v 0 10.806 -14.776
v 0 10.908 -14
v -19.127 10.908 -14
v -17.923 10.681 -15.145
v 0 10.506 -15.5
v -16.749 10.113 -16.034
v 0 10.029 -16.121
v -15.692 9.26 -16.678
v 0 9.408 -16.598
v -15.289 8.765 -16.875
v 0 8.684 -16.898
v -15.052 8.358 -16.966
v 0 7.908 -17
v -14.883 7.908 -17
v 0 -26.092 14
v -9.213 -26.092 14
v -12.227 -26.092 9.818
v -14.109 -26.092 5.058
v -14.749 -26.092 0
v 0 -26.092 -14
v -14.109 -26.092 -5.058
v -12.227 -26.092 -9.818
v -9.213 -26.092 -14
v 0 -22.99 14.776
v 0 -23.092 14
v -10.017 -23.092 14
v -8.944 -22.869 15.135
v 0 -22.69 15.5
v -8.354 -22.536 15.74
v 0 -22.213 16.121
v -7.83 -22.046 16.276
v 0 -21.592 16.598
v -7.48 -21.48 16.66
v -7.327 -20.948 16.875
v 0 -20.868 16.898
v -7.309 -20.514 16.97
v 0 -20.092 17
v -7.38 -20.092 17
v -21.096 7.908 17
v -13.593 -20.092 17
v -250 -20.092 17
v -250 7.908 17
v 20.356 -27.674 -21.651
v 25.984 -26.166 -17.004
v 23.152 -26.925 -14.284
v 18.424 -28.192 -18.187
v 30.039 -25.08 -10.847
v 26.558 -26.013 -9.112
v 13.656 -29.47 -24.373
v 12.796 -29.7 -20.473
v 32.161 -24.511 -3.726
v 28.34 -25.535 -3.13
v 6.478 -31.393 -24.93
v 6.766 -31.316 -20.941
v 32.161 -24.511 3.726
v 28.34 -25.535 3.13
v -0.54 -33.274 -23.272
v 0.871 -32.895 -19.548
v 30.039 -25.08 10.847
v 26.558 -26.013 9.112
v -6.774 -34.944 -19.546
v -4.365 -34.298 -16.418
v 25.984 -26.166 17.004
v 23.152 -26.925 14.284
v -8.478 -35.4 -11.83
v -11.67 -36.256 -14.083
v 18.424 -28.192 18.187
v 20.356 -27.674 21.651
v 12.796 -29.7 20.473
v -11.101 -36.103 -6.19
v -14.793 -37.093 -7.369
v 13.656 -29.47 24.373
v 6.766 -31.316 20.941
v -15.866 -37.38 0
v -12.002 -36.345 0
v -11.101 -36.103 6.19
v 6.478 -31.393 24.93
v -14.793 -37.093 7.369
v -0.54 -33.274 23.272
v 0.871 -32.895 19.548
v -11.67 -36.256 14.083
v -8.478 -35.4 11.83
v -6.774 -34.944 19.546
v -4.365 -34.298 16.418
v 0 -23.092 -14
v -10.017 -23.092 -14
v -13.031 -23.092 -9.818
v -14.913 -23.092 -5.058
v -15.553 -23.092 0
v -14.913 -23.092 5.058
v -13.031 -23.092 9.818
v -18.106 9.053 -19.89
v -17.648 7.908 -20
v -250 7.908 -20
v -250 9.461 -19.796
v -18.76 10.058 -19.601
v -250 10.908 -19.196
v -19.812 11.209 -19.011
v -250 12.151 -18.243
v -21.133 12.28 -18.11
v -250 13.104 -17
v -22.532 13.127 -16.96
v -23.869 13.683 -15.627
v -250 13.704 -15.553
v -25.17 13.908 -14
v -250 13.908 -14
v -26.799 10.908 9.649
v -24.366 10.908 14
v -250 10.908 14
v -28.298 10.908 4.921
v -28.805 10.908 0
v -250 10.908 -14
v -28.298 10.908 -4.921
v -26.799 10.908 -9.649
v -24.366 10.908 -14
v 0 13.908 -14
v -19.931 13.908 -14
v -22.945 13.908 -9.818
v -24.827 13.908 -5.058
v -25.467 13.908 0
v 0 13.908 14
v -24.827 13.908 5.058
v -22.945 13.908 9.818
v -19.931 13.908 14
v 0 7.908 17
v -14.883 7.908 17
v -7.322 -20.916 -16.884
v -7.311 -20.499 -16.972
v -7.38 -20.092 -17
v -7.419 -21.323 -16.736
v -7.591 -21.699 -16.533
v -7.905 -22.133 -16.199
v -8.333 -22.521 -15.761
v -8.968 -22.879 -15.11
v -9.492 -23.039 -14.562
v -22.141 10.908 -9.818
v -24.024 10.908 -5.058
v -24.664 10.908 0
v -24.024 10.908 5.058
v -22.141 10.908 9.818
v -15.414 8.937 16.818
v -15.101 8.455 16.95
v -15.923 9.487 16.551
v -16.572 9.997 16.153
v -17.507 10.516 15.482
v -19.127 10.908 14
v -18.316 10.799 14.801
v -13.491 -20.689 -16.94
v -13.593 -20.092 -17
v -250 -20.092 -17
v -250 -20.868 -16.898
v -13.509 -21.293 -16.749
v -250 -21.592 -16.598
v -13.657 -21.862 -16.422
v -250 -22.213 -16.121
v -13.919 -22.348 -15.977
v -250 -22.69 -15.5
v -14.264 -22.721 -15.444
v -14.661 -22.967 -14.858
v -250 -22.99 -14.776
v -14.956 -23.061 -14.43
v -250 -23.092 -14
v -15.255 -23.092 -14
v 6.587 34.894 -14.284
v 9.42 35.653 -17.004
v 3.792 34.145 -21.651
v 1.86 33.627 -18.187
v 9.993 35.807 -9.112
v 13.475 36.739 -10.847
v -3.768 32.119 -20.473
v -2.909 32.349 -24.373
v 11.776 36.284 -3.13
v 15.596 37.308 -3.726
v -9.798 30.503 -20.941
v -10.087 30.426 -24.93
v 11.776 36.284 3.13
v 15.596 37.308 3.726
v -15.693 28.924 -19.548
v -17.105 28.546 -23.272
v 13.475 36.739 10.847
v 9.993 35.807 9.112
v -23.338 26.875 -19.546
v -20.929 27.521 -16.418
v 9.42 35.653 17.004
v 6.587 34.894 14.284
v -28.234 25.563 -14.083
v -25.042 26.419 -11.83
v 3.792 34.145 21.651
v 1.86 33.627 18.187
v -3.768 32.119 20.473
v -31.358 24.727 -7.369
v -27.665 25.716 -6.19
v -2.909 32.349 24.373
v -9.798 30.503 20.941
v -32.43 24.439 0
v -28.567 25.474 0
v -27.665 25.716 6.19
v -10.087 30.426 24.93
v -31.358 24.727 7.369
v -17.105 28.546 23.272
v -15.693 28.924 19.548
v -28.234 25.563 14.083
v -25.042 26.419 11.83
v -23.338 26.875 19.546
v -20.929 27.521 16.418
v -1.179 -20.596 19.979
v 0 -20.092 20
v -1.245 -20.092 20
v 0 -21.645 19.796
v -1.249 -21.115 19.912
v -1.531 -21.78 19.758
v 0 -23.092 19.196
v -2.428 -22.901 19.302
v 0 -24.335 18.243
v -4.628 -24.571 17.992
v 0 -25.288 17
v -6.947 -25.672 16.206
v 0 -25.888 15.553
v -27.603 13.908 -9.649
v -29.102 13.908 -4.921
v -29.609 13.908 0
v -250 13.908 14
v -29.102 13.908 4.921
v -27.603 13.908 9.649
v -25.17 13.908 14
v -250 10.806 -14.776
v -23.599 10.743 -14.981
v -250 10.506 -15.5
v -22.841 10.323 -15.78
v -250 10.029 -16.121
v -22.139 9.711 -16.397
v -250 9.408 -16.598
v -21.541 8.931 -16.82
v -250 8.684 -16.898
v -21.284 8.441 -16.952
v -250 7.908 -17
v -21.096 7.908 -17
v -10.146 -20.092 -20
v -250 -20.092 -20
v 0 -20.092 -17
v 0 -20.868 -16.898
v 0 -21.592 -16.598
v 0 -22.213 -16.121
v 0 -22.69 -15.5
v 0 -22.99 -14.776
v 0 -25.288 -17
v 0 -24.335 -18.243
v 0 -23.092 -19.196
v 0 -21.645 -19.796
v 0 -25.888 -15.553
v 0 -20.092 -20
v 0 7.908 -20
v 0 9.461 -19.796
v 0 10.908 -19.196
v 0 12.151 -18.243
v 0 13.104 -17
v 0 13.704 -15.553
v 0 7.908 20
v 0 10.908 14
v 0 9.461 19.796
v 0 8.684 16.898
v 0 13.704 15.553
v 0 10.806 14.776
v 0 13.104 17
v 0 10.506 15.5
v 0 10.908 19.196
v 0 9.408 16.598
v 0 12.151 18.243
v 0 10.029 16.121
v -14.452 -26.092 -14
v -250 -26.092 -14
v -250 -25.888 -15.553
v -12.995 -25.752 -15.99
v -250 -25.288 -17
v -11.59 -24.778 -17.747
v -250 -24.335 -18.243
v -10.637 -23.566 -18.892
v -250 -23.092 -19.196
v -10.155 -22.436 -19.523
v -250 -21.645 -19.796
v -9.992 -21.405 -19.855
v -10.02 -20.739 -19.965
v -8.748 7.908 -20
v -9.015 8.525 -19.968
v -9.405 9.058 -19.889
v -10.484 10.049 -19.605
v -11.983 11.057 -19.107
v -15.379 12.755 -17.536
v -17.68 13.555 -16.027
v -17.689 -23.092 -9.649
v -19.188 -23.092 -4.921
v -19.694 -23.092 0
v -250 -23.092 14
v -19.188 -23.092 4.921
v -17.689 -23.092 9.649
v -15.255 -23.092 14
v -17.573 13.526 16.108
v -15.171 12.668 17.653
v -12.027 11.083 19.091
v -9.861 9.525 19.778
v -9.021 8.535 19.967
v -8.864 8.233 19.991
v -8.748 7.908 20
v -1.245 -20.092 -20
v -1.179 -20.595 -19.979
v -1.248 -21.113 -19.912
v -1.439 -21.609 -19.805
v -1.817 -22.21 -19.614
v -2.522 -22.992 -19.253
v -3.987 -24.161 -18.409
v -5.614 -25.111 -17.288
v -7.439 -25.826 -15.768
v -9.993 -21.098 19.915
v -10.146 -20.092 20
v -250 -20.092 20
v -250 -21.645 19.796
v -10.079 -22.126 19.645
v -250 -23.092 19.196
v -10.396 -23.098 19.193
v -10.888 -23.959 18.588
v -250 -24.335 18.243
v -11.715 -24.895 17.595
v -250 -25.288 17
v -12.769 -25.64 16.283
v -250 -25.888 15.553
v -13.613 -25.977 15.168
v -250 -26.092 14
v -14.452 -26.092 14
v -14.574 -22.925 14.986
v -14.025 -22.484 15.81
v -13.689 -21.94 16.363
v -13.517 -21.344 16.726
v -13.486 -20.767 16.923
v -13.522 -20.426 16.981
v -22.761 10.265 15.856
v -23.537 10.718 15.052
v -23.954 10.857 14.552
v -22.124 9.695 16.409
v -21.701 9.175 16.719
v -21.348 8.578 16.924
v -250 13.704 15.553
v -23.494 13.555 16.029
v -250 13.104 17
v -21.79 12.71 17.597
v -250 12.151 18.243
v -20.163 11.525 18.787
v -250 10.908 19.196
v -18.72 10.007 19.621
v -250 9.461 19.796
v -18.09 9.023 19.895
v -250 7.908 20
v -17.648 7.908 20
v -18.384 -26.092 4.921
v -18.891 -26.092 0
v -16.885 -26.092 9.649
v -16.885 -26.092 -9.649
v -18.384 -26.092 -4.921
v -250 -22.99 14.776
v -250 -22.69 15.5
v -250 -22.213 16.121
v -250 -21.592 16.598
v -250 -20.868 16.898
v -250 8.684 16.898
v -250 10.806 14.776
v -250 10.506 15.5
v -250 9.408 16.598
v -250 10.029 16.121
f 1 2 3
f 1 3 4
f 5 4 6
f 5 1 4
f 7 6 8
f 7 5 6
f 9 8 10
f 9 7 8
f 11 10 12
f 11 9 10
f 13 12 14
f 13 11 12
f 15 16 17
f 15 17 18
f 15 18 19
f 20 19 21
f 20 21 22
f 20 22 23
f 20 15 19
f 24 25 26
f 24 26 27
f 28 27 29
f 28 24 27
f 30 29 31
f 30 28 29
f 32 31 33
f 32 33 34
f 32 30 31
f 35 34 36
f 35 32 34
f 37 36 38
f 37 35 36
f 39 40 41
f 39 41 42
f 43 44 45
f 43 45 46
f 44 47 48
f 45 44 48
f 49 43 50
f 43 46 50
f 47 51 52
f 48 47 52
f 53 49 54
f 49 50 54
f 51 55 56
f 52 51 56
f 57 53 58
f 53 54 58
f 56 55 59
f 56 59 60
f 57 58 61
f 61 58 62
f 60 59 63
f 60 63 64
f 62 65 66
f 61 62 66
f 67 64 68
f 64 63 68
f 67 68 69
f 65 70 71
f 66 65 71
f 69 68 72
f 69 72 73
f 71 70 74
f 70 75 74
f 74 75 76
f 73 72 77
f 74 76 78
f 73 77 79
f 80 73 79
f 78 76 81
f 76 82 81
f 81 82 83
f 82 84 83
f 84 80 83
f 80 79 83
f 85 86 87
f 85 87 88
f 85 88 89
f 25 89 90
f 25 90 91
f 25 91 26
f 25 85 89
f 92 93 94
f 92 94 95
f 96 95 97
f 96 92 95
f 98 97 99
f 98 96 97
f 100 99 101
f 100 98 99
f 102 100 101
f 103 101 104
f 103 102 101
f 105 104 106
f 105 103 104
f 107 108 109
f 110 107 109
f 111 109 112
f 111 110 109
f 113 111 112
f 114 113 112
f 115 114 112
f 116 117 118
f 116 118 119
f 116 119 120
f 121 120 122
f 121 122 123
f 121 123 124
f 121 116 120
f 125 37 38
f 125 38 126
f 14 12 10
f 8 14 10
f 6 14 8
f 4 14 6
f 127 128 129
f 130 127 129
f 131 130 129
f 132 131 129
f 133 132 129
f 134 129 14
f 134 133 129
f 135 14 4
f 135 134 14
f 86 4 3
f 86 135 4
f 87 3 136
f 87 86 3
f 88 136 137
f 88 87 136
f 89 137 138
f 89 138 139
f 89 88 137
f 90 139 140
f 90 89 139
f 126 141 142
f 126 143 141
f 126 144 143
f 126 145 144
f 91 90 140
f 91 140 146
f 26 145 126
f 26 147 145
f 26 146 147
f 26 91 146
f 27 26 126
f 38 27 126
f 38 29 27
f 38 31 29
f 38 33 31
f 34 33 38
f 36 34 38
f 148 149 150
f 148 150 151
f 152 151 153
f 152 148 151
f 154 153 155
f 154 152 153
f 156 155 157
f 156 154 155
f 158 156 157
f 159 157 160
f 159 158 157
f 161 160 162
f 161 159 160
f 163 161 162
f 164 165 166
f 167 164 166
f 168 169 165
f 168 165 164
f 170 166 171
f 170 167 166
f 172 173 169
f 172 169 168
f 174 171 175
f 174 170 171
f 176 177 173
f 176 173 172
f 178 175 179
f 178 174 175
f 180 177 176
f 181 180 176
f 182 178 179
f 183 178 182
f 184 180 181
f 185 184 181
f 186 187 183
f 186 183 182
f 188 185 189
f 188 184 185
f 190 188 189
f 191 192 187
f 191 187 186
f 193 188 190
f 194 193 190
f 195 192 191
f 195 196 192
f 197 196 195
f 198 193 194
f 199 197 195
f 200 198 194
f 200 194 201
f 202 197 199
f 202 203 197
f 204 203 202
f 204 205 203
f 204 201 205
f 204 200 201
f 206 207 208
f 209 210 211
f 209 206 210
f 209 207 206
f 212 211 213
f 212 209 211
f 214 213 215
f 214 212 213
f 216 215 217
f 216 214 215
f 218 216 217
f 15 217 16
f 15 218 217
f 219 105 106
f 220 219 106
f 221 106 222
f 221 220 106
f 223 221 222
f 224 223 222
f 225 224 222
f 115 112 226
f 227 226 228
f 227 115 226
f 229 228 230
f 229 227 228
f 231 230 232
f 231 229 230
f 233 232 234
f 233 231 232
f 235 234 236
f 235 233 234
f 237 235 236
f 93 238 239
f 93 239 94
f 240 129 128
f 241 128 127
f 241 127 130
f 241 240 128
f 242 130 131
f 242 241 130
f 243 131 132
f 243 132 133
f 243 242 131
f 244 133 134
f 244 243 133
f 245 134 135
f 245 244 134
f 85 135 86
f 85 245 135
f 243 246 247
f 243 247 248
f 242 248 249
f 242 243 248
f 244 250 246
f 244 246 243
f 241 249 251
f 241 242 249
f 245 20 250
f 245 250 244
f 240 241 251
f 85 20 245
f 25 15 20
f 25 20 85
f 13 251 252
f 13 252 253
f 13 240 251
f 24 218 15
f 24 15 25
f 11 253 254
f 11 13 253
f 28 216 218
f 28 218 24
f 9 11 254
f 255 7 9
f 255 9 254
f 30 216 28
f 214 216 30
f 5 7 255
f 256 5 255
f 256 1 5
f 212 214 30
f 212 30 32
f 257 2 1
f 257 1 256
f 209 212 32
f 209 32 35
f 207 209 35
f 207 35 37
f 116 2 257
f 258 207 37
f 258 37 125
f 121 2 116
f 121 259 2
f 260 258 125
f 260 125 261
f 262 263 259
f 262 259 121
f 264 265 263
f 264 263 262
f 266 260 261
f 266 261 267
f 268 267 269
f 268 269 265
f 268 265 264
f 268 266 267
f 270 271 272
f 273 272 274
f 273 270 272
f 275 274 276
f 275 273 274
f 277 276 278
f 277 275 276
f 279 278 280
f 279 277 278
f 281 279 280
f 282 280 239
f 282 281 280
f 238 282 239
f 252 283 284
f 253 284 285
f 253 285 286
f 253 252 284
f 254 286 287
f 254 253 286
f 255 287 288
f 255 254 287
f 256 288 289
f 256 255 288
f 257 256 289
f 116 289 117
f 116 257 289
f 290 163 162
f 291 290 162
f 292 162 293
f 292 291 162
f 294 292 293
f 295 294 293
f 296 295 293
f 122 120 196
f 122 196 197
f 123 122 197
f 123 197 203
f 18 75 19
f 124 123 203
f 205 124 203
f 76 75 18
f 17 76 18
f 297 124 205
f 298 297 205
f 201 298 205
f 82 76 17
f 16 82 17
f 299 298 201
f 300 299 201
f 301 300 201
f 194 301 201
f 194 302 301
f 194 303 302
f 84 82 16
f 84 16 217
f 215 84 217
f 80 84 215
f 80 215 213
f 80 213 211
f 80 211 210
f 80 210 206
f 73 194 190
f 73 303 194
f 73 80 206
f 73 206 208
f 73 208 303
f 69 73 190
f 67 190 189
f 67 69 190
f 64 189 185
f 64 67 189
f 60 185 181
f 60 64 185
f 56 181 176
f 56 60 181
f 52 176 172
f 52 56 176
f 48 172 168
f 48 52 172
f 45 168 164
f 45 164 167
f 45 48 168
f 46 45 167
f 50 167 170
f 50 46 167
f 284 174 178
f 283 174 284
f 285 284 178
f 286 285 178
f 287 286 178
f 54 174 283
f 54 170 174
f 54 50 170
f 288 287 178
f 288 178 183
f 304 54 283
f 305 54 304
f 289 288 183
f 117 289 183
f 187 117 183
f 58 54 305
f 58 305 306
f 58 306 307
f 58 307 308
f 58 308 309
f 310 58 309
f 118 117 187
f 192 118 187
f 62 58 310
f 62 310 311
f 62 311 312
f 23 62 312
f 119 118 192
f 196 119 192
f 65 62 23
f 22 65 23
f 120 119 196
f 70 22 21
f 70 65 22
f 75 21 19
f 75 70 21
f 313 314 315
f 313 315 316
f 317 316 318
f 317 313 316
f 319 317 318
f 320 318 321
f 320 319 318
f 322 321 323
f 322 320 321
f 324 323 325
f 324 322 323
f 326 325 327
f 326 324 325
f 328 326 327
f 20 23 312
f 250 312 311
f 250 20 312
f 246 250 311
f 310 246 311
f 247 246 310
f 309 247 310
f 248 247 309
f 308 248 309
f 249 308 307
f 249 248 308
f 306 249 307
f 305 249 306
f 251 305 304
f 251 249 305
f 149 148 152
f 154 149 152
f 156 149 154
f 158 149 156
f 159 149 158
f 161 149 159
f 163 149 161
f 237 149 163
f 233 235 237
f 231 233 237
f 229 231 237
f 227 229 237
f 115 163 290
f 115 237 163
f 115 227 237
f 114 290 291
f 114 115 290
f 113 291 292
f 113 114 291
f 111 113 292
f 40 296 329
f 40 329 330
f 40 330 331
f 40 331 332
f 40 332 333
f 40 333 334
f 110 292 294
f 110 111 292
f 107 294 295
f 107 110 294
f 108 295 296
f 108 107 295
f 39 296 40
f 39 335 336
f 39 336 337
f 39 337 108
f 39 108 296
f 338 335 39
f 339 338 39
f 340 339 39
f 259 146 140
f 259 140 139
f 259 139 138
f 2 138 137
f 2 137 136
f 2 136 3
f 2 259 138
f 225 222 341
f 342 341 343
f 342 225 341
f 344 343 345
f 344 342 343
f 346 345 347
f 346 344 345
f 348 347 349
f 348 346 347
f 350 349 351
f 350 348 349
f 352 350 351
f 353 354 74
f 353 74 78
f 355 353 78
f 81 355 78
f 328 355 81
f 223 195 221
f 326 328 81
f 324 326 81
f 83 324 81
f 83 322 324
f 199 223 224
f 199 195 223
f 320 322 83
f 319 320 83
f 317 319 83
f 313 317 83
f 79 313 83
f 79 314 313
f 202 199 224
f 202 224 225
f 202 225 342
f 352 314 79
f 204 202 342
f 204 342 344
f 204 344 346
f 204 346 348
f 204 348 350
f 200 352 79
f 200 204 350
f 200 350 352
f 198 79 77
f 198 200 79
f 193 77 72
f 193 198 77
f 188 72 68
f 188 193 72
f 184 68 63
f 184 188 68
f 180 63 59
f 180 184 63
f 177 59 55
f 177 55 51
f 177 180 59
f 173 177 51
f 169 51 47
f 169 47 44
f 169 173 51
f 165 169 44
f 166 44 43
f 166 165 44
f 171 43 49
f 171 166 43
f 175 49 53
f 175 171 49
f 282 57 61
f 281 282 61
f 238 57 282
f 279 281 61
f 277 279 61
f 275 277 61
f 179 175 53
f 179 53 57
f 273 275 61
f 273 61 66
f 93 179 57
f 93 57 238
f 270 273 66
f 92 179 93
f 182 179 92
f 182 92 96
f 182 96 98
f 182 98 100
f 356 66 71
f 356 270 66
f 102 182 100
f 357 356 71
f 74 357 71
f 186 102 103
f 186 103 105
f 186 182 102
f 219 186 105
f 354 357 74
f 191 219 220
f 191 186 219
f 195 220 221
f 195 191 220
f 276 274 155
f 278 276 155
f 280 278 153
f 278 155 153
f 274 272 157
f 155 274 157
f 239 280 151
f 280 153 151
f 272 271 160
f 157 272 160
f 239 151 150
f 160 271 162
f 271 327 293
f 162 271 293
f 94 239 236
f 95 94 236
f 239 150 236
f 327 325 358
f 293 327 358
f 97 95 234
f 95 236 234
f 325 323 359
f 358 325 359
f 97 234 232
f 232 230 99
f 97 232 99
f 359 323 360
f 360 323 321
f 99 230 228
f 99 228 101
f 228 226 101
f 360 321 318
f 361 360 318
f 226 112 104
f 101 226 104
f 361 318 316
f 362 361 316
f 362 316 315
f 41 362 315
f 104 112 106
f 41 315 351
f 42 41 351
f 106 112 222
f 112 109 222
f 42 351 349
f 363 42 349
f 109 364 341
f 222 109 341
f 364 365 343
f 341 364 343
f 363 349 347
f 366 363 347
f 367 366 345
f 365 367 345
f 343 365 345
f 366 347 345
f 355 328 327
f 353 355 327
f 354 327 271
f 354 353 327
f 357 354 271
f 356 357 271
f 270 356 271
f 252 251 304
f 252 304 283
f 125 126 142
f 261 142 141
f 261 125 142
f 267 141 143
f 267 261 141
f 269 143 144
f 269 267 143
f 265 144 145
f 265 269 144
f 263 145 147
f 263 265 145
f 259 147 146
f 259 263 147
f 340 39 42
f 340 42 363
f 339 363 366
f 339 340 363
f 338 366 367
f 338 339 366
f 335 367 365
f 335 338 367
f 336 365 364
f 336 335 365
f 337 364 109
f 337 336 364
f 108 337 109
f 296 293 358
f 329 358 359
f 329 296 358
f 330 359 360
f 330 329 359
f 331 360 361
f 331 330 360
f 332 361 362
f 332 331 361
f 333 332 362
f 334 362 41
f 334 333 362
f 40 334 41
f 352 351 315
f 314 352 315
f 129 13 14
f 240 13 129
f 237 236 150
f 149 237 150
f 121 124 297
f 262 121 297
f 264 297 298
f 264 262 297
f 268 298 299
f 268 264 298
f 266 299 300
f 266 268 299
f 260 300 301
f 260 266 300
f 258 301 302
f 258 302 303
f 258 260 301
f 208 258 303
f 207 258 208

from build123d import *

# Parameters (mm, degrees)
F0_R     = 25
F0_R_2   = 21
F1_DEPTH = 32
F2_ANGLE = 165
F4_DEPTH = 250


with BuildPart() as f1:
    # F0 (on Front) → F1 (new body, symmetric)
    with BuildSketch(Plane.XZ):
        Circle(F0_R)
        Circle(F0_R_2, mode=Mode.SUBTRACT)
    extrude(amount=F1_DEPTH, both=True)


with BuildPart() as f1_1:
    # F2: moved
    add(f1.part.rotate(Axis((0, 0, -29.1226431727), (0, 0, -1)), F2_ANGLE))

    # F3 (on Right) → F4 (join)
    with BuildSketch(Plane.YZ):
        with BuildLine():
            ThreePointArc((-26.0919821262, -14), (-24.3346228134, -18.2426406871), (-20.0919821262, -20))
            Line((-20.0919821262, -20), (7.9080178738, -20))
            ThreePointArc((7.9080178738, -20), (12.1506585609, -18.2426406871), (13.9080178738, -14))
            Line((13.9080178738, -14), (13.9080178738, 14))
            ThreePointArc((13.9080178738, 14), (12.1506585609, 18.2426406871), (7.9080178738, 20))
            Line((7.9080178738, 20), (-20.0919821262, 20))
            ThreePointArc((-20.0919821262, 20), (-24.3346228134, 18.2426406871), (-26.0919821262, 14))
            Line((-26.0919821262, 14), (-26.0919821262, -14))
        make_face()
        with BuildLine():
            Line((7.9080178738, -17), (-20.0919821262, -17))
            ThreePointArc((-20.0919821262, -17), (-22.2133024698, -16.1213203436), (-23.0919821262, -14))
            Line((-23.0919821262, -14), (-23.0919821262, 14))
            ThreePointArc((-23.0919821262, 14), (-22.2133024698, 16.1213203436), (-20.0919821262, 17))
            Line((-20.0919821262, 17), (7.9080178738, 17))
            ThreePointArc((7.9080178738, 17), (10.0293382173, 16.1213203436), (10.9080178738, 14))
            Line((10.9080178738, 14), (10.9080178738, -14))
            ThreePointArc((10.9080178738, -14), (10.0293382173, -16.1213203436), (7.9080178738, -17))
        make_face(mode=Mode.SUBTRACT)
    extrude(amount=-F4_DEPTH)


solid = f1_1.part
